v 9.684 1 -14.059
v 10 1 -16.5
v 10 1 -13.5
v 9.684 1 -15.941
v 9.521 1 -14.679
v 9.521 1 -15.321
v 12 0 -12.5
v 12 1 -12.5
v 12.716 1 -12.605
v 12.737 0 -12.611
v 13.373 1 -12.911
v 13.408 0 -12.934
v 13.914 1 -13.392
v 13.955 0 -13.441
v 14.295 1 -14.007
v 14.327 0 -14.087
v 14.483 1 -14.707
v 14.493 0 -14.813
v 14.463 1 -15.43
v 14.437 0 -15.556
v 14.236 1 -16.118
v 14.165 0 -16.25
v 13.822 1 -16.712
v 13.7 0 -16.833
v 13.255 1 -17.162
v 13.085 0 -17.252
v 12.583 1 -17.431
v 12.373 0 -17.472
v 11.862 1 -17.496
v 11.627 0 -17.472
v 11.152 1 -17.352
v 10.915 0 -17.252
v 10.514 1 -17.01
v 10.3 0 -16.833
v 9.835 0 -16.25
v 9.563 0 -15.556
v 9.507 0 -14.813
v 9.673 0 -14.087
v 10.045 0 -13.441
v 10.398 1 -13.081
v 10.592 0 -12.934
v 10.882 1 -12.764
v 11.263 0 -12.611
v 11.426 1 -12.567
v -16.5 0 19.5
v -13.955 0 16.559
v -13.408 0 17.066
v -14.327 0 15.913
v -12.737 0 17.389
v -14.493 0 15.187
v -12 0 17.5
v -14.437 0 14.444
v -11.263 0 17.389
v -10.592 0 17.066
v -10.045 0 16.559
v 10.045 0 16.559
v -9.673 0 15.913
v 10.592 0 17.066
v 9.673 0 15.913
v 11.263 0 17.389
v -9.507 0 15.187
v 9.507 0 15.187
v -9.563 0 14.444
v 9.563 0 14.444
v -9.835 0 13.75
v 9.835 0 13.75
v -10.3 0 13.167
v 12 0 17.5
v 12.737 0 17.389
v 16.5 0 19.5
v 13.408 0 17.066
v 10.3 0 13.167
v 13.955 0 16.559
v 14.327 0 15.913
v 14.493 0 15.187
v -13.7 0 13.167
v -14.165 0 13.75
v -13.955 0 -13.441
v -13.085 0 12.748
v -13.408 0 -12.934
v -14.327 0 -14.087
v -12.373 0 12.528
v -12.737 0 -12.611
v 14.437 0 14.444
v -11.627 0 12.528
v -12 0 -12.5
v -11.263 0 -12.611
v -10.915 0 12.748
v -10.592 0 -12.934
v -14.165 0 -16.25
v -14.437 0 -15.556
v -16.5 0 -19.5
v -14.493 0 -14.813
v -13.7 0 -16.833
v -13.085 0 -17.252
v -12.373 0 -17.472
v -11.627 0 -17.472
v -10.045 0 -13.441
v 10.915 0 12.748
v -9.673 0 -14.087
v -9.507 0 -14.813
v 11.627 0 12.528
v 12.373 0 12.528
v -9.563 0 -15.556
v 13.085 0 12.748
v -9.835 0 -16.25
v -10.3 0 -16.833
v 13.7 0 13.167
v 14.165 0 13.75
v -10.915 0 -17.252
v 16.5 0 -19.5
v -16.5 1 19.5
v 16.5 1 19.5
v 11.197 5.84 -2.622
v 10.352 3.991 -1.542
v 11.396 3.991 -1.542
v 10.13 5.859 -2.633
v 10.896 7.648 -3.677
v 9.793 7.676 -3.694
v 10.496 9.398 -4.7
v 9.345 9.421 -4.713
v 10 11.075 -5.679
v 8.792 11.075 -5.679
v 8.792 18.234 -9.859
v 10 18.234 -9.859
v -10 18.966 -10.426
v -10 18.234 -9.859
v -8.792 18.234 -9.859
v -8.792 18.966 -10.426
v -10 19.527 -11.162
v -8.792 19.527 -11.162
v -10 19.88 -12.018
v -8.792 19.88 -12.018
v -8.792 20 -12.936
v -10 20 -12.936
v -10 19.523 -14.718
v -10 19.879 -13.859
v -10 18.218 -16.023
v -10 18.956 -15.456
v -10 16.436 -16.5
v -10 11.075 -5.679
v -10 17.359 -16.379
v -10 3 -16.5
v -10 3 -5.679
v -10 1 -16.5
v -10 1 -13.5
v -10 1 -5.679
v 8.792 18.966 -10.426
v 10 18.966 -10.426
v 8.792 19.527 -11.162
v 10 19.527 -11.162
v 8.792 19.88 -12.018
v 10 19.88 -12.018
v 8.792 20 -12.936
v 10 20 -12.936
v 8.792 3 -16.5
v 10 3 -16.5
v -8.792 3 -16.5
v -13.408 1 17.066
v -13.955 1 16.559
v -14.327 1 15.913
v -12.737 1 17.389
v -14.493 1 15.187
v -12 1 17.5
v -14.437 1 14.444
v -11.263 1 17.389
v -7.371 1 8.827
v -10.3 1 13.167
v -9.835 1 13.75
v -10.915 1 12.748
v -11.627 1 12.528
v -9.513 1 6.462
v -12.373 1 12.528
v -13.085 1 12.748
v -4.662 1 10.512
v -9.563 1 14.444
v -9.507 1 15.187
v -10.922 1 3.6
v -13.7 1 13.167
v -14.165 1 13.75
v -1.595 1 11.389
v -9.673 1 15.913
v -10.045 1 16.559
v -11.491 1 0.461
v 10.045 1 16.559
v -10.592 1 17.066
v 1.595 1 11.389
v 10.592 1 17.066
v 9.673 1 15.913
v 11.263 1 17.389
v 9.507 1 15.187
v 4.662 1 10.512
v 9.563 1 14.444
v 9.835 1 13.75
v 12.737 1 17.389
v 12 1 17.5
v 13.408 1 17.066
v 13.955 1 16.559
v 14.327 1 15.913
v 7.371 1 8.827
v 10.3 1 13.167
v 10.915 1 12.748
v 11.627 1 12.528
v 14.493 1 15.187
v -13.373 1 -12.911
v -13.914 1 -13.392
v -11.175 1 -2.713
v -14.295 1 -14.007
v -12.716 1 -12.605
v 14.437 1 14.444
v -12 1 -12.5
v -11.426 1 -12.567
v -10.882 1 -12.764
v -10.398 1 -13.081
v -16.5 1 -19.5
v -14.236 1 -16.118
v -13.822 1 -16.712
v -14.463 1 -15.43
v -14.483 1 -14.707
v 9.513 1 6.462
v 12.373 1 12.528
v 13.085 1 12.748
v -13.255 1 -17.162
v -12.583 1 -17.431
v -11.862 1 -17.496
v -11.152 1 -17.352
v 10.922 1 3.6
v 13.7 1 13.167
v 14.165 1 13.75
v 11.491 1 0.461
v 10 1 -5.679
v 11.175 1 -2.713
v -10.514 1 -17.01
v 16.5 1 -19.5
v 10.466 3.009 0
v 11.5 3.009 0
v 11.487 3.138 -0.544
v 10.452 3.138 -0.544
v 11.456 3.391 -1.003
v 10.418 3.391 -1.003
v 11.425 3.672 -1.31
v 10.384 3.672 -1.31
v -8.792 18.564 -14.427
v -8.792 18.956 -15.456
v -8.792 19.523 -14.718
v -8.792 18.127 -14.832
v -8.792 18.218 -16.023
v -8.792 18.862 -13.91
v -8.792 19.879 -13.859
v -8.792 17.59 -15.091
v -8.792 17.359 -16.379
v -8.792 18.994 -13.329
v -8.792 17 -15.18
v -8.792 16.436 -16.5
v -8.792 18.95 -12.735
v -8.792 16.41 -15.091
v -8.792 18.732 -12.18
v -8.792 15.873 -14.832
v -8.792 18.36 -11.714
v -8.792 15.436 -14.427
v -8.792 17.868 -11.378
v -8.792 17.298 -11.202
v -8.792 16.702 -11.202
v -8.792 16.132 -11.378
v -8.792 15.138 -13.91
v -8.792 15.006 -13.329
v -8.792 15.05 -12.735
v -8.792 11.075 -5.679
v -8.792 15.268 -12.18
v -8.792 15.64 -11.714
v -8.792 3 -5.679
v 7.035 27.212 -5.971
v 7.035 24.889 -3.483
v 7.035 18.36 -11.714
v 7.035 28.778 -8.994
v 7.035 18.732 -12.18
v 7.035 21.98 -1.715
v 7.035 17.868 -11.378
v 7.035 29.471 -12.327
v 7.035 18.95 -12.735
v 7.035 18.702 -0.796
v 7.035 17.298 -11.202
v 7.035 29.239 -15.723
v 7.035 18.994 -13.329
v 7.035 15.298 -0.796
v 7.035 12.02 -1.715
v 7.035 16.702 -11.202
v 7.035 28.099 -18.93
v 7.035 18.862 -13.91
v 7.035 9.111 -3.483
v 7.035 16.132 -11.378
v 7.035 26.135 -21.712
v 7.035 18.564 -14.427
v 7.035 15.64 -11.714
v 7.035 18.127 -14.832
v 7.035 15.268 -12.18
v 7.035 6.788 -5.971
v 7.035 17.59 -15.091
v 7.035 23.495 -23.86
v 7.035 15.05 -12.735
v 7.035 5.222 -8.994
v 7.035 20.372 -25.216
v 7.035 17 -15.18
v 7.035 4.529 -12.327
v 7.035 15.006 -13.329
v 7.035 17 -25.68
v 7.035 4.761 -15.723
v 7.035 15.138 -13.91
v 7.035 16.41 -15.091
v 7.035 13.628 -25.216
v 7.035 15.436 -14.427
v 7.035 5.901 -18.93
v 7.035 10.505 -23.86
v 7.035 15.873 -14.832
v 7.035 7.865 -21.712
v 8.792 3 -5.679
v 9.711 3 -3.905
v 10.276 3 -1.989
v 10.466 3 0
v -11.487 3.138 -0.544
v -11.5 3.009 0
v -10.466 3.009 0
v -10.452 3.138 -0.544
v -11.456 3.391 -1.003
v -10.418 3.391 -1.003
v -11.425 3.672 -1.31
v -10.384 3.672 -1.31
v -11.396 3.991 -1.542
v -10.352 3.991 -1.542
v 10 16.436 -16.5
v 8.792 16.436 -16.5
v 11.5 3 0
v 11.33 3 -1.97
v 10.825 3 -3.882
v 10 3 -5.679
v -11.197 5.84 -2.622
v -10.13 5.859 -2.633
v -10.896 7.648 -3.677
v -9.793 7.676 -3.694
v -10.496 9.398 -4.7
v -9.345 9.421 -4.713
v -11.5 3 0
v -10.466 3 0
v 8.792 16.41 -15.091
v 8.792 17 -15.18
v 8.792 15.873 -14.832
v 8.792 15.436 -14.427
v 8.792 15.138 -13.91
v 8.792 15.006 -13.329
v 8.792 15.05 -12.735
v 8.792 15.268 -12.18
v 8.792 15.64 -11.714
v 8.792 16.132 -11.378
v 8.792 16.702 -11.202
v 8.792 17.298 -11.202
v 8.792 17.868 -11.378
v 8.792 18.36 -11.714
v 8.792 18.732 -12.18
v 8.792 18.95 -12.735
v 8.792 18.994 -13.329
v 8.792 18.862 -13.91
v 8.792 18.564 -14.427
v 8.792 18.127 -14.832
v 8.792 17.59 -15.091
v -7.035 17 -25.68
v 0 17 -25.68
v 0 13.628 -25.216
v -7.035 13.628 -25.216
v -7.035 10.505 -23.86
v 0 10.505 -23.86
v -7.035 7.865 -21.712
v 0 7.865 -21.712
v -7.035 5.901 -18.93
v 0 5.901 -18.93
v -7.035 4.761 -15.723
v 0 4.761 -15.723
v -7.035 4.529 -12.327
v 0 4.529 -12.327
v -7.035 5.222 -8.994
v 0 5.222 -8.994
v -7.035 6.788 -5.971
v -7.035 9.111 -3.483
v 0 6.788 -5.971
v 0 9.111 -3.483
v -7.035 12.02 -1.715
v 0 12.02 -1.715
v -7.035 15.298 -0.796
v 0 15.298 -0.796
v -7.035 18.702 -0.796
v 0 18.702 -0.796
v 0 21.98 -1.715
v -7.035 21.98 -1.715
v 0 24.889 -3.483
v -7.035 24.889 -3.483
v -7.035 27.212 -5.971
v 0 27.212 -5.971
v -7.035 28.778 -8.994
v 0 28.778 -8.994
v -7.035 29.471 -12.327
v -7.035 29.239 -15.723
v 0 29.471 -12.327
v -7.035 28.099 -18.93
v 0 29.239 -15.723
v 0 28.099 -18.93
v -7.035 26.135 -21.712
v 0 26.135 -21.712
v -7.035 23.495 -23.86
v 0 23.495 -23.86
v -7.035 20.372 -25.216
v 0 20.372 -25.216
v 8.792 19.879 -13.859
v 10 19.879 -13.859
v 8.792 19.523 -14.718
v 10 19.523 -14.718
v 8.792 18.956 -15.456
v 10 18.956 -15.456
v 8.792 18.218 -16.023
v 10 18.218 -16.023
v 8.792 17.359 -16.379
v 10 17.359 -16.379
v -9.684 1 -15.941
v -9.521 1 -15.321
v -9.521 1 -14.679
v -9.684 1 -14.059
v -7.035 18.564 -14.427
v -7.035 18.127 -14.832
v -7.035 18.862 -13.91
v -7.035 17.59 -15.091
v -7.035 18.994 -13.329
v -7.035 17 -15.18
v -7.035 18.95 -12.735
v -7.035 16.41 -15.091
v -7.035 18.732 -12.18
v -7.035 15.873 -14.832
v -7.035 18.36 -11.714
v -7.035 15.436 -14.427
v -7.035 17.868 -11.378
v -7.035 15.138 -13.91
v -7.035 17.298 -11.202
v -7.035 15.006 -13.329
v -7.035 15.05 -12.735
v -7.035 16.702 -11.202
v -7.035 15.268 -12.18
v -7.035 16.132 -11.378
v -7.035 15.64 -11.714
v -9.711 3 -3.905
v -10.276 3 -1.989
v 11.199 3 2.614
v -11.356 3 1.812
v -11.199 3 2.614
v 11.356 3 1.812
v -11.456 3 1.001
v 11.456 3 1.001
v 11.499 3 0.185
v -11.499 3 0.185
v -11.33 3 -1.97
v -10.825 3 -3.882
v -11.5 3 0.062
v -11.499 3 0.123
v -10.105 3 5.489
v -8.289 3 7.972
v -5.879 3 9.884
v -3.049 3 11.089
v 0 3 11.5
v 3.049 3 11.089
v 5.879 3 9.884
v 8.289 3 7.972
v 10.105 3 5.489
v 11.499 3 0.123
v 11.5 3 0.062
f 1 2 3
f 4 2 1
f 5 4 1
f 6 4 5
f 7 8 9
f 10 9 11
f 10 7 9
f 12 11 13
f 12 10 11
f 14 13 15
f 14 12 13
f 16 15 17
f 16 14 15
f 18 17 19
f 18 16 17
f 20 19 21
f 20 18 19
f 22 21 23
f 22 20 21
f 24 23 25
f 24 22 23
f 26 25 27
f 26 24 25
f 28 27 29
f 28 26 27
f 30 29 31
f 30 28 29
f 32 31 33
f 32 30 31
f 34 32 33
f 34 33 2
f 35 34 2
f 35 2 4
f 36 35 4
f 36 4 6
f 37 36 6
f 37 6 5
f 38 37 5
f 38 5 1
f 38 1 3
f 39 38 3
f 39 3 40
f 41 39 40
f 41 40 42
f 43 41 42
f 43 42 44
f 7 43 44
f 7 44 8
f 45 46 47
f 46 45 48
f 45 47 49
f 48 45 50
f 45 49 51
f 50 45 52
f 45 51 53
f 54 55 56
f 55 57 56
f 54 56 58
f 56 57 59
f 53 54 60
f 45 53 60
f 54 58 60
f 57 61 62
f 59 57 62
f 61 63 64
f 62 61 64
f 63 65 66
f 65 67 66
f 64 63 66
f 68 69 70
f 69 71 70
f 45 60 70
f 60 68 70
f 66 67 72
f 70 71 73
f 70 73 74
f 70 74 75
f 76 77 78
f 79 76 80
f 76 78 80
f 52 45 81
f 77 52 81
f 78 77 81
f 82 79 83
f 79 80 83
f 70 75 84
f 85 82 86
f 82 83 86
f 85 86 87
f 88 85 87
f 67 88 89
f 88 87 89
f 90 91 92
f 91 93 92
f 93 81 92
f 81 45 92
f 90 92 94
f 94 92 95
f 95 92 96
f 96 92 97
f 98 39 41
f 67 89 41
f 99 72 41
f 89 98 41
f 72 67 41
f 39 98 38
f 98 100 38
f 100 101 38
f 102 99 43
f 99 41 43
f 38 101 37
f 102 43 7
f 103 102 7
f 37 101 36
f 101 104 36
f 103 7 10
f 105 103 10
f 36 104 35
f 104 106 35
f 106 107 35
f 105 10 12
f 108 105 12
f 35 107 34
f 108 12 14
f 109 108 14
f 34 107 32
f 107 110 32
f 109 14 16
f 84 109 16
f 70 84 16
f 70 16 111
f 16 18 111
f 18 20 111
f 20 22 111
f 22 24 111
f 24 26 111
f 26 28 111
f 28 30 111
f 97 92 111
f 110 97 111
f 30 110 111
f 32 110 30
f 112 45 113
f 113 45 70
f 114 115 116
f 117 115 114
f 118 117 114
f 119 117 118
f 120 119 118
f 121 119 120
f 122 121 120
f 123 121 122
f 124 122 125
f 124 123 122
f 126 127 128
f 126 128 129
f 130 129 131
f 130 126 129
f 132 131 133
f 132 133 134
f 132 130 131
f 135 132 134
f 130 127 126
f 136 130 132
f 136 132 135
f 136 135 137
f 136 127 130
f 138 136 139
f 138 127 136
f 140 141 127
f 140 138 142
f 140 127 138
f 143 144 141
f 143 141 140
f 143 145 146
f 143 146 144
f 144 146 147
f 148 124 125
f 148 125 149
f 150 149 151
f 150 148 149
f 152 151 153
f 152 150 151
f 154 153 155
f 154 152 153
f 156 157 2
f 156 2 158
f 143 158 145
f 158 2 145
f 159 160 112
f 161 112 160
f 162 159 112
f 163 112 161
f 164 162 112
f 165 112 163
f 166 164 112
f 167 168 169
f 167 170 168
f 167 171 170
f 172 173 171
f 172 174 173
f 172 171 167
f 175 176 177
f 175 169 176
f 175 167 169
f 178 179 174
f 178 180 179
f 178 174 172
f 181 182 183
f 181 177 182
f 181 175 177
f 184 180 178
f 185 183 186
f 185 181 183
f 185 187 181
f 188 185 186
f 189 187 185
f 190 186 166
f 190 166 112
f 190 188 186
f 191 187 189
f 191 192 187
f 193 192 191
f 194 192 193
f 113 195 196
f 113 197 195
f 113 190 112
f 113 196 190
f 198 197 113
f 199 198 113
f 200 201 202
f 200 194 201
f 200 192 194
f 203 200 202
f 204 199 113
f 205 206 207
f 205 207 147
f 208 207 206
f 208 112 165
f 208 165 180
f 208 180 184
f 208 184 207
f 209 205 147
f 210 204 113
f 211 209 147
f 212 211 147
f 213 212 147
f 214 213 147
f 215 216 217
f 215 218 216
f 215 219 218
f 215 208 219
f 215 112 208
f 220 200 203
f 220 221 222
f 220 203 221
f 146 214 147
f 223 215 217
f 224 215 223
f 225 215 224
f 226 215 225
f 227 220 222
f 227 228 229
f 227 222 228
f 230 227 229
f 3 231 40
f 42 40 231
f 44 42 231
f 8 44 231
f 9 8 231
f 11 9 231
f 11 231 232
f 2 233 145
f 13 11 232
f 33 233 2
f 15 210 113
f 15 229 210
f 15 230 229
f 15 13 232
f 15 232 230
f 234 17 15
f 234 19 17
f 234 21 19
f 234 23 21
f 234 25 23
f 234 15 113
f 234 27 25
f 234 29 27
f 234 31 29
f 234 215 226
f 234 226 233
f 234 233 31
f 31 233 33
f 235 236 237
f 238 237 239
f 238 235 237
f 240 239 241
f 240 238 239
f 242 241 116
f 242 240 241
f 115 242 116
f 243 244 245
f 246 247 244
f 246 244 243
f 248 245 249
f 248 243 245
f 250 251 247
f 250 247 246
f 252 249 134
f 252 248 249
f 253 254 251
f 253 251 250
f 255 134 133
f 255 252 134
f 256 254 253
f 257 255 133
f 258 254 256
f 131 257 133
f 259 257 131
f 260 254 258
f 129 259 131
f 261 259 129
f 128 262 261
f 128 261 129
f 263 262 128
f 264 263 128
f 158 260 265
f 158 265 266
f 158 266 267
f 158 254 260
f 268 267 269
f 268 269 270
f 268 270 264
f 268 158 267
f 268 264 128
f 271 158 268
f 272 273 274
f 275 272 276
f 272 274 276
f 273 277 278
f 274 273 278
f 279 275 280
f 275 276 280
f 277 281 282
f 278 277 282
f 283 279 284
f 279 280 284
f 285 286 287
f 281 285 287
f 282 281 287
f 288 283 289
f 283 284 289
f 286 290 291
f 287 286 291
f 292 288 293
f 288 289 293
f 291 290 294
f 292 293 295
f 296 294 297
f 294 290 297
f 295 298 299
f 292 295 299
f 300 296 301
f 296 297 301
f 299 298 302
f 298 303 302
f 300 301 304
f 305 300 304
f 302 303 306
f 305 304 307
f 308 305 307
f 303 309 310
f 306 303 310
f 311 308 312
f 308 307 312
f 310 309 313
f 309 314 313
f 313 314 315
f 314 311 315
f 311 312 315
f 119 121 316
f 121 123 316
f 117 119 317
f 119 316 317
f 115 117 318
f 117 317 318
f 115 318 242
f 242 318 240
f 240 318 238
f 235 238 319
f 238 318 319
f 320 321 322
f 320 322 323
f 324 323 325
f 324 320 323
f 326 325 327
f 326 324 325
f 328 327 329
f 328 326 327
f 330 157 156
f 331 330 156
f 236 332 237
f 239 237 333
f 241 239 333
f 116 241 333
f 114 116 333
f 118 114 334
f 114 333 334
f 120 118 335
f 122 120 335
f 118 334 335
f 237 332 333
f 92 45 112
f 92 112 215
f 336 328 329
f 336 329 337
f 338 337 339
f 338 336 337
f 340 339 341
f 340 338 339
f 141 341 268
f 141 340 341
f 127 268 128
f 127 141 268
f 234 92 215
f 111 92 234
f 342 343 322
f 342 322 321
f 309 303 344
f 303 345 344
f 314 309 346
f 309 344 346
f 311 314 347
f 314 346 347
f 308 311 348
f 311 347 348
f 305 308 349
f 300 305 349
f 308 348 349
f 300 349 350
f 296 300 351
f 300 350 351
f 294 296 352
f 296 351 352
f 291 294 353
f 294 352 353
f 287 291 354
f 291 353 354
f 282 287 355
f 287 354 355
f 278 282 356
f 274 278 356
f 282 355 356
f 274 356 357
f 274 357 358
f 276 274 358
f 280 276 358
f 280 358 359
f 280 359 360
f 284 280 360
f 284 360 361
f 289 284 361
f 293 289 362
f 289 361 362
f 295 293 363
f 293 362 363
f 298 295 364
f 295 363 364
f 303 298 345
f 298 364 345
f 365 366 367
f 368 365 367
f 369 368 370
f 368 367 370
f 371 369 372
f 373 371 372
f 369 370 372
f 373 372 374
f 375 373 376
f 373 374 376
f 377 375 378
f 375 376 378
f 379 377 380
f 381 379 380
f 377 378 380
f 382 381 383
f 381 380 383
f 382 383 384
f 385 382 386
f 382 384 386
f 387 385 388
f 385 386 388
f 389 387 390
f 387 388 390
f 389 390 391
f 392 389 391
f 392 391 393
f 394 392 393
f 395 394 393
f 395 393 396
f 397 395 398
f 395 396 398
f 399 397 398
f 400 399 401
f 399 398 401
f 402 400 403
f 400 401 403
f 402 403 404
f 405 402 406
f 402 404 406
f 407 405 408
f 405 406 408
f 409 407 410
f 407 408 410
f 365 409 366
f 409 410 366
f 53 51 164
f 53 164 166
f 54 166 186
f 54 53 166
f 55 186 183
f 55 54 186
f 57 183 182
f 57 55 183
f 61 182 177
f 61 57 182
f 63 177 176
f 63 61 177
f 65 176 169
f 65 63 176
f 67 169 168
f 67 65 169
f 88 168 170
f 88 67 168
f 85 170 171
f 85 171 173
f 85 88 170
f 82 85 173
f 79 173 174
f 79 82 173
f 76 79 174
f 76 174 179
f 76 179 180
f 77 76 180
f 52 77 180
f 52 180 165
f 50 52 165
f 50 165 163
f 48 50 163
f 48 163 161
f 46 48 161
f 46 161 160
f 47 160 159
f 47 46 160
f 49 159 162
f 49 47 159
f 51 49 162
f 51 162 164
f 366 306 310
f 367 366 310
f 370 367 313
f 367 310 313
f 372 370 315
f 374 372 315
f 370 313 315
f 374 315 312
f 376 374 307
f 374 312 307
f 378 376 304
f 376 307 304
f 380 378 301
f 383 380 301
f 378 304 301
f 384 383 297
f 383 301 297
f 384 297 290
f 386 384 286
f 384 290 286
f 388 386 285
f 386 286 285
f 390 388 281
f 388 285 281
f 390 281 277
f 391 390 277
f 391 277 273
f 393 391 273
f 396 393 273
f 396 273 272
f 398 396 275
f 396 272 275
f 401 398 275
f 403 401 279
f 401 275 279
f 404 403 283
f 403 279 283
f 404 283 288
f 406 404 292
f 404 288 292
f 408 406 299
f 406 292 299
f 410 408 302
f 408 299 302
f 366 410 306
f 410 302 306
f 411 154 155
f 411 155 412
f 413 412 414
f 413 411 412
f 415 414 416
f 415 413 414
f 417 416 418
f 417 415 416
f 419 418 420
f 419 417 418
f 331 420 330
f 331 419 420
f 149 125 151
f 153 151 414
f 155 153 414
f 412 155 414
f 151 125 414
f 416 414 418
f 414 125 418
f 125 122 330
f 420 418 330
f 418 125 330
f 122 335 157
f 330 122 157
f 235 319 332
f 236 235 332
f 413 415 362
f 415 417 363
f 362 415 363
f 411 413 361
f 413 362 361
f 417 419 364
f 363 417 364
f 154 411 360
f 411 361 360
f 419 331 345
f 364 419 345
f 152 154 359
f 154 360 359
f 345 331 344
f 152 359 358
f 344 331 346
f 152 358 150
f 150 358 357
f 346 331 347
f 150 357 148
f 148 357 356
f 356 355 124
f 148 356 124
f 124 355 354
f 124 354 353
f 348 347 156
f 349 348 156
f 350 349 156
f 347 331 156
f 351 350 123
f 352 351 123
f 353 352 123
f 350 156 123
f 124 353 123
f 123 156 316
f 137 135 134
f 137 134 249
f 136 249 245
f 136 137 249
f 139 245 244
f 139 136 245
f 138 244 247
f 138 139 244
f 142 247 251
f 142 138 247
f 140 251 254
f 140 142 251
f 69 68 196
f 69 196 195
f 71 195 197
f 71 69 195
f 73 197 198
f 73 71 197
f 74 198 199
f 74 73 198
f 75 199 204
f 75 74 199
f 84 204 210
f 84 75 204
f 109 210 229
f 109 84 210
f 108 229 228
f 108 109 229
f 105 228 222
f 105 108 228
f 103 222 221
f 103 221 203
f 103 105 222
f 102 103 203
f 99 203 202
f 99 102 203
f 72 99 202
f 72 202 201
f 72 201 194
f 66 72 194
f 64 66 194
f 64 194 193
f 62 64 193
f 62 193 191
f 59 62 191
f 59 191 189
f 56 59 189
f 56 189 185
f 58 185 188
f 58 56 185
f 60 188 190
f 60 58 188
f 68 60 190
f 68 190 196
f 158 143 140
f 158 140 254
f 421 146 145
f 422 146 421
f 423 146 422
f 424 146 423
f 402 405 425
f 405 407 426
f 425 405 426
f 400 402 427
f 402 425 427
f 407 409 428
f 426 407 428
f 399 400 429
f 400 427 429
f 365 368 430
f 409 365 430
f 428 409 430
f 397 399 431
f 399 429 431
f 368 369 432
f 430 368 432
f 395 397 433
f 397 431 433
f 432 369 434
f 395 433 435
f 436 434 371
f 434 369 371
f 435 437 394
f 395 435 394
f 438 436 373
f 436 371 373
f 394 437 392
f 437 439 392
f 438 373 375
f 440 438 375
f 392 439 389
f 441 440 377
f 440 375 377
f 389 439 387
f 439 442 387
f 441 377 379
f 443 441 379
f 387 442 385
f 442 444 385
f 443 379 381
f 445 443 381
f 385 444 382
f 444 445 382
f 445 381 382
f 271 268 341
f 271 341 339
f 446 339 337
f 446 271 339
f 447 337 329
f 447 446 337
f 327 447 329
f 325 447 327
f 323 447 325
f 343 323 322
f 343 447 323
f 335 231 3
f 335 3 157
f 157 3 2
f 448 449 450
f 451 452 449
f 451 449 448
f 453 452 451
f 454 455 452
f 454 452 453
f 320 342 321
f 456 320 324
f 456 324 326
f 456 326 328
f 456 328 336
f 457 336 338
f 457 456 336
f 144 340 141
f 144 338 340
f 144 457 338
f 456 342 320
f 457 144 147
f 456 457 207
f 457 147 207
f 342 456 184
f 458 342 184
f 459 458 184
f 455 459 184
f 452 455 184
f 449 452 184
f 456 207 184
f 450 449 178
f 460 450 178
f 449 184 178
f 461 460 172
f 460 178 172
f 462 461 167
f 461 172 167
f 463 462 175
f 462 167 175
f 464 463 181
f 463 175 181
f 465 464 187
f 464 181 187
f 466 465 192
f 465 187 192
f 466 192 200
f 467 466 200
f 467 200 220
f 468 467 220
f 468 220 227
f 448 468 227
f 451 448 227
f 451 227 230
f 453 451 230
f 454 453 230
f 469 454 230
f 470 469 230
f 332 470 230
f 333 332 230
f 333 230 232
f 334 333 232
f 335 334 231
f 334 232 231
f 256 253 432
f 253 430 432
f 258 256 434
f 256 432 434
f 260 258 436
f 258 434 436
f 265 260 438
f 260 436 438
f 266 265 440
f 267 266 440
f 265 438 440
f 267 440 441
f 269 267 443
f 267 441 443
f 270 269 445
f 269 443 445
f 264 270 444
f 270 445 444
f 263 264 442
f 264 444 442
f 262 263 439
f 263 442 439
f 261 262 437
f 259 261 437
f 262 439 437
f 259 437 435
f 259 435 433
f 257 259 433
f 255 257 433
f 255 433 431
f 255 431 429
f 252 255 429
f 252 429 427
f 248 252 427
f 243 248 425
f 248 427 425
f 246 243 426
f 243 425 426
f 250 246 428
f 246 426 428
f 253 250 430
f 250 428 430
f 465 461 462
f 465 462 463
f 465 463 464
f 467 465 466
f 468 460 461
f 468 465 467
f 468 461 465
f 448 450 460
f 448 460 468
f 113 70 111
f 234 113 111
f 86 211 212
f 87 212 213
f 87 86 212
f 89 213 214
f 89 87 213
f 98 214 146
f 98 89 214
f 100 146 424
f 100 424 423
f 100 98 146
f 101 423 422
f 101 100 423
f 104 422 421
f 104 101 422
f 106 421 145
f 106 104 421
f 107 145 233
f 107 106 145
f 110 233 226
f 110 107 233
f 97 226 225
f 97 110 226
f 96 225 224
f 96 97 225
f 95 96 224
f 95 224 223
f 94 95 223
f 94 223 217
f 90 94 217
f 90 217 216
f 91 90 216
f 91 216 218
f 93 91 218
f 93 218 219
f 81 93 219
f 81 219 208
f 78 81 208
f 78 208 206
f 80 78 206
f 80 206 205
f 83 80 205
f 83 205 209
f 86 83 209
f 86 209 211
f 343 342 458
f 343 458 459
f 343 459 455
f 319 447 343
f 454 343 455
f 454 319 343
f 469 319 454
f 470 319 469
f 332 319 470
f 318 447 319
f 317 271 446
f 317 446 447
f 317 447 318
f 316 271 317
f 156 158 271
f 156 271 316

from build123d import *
from build123d.topology import SkipClean

# Parameters (mm, degrees)
SKETCH1_W               = 33
SKETCH1_H               = 39
SKETCH1_R               = 2.5
BOSS_EXTRUDE1_DEPTH     = 1
BOSS_EXTRUDE2_DEPTH     = 2
BOSS_EXTRUDE3_START     = -17
BOSS_EXTRUDE3_DEPTH     = 17
CUT_EXTRUDE1_DEPTH      = 39.503246616
CUT_EXTRUDE1_DEPTH_BACK = 39.503246616


with BuildPart() as part:
    # Sketch1 → Boss-Extrude1 (new body)
    with BuildSketch(Plane(origin=(0, 0, 0), x_dir=(1, 0, 0), z_dir=(0, 1, 0))):
        Rectangle(SKETCH1_W, SKETCH1_H)
        with Locations(Location((12, -15, 0), (0, 0, 270))):
            Circle(SKETCH1_R, mode=Mode.SUBTRACT)
        with Locations(Location((-12, -15, 0), (0, 0, 270))):
            Circle(SKETCH1_R, mode=Mode.SUBTRACT)
        with Locations(Location((-12, 15, 0), (0, 0, 270))):
            Circle(SKETCH1_R, mode=Mode.SUBTRACT)
        with Locations(Location((12, 15, 0), (0, 0, 270))):
            Circle(SKETCH1_R, mode=Mode.SUBTRACT)
    extrude(amount=BOSS_EXTRUDE1_DEPTH)

    # Sketch2 → Boss-Extrude2 (add)
    with BuildSketch(Plane(origin=(0, 1, 0), x_dir=(1, 0, 0), z_dir=(0, 1, 0))):
        with BuildLine():
            Line((10, 5.678908346), (10, 16.5))
            Line((10, 16.5), (-10, 16.5))
            Line((-10, 16.5), (-10, 5.678908346))
            ThreePointArc((-10, 5.678908346), (0, -11.5), (10, 5.678908346))
        make_face()
    extrude(amount=BOSS_EXTRUDE2_DEPTH)

    # Sketch3 → Boss-Extrude3 (add)
    with SkipClean():  # the faces are left unmerged after this step: merging them gives an invalid solid
        with BuildSketch(Plane(origin=(0, 20, 0), x_dir=(1, 0, 0), z_dir=(0, 1, 0)).offset(BOSS_EXTRUDE3_START)):
            with BuildLine():
                Line((-10.466352676, 0), (-11.5, 0))
                ThreePointArc((-11.5, 0), (-11.118677979, 2.936835031), (-10, 5.678908346))
                Line((-10, 5.678908346), (-10, 16.5))
                Line((-10, 16.5), (-8.791731248, 16.5))
                Line((-8.791731248, 16.5), (-8.791731248, 5.678908346))
                ThreePointArc((-8.791731248, 5.678908346), (-10.038971516, 2.960336), (-10.466352676, 0))
            make_face()
            with BuildLine():
                Line((8.791731248, 16.5), (8.791731248, 5.678908346))
                ThreePointArc((8.791731248, 5.678908346), (10.038971516, 2.960336), (10.466352676, 0))
                Line((10.466352676, 0), (11.5, 0))
                ThreePointArc((11.5, 0), (11.118677979, 2.936835031), (10, 5.678908346))
                Line((10, 5.678908346), (10, 16.5))
                Line((10, 16.5), (8.791731248, 16.5))
            make_face()
        extrude(amount=BOSS_EXTRUDE3_DEPTH)

    # Sketch4 → Cut-Extrude1 (cut, two sides: drawn at the far end of the back side and taken through both)
    with SkipClean():  # the faces are left unmerged after this step: merging them gives an invalid solid
        with BuildSketch(Plane(origin=(10, 0, 0), x_dir=(0, 0, -1), z_dir=(1, 0, 0)).offset(-CUT_EXTRUDE1_DEPTH_BACK)):
            with BuildLine():
                Line((-2.613781241, 3), (-0.185143028, 3))
                ThreePointArc((-0.185143028, 3), (0.810549083, 3.265469165), (1.541915642, 3.991402781))
                Line((1.541915642, 3.991402781), (9.859295901, 18.23356349))
                ThreePointArc((9.859295901, 18.23356349), (13.867346815, 19.876273461), (16.5, 16.436490709))
                Line((16.5, 16.436490709), (17.783999393, 20))
                Line((17.783999393, 20), (0.550387099, 24.196515301))
                Line((0.550387099, 24.196515301), (-11.381791723, 8.604740189))
                Line((-11.381791723, 8.604740189), (-2.613781241, 3))
            make_face()
        extrude(amount=CUT_EXTRUDE1_DEPTH + CUT_EXTRUDE1_DEPTH_BACK, mode=Mode.SUBTRACT)

    # Sketch5 → Revolve1 (revolve)
    with SkipClean():  # the faces are left unmerged after this step: merging them gives an invalid solid
        with BuildSketch(Plane(origin=(0, 17, 0), x_dir=(1, 0, 0), z_dir=(0, 1, 0)), mode=Mode.PRIVATE) as revolve1_sk:
            Polygon((7.035069501, 11.179647951), (8.791731248, 11.179647951), (8.791731248, 13.179647951), (0, 13.179647951), (0, 0.679647951), (7.035069501, 0.679647951), align=None)
            Polygon((0, 0.679647951), (0, 13.179647951), (-8.791731248, 13.179647951), (-8.791731248, 11.179647951), (-7.035069501, 11.179647951), (-7.035069501, 0.679647951), align=None)
        revolve(revolve1_sk.sketch.rotate(Axis((8.791731248, 17, -13.179647951), (-1, 0, 0)), 180), axis=Axis((8.791731248, 17, -13.179647951), (-1, 0, 0)))


solid = part.part
